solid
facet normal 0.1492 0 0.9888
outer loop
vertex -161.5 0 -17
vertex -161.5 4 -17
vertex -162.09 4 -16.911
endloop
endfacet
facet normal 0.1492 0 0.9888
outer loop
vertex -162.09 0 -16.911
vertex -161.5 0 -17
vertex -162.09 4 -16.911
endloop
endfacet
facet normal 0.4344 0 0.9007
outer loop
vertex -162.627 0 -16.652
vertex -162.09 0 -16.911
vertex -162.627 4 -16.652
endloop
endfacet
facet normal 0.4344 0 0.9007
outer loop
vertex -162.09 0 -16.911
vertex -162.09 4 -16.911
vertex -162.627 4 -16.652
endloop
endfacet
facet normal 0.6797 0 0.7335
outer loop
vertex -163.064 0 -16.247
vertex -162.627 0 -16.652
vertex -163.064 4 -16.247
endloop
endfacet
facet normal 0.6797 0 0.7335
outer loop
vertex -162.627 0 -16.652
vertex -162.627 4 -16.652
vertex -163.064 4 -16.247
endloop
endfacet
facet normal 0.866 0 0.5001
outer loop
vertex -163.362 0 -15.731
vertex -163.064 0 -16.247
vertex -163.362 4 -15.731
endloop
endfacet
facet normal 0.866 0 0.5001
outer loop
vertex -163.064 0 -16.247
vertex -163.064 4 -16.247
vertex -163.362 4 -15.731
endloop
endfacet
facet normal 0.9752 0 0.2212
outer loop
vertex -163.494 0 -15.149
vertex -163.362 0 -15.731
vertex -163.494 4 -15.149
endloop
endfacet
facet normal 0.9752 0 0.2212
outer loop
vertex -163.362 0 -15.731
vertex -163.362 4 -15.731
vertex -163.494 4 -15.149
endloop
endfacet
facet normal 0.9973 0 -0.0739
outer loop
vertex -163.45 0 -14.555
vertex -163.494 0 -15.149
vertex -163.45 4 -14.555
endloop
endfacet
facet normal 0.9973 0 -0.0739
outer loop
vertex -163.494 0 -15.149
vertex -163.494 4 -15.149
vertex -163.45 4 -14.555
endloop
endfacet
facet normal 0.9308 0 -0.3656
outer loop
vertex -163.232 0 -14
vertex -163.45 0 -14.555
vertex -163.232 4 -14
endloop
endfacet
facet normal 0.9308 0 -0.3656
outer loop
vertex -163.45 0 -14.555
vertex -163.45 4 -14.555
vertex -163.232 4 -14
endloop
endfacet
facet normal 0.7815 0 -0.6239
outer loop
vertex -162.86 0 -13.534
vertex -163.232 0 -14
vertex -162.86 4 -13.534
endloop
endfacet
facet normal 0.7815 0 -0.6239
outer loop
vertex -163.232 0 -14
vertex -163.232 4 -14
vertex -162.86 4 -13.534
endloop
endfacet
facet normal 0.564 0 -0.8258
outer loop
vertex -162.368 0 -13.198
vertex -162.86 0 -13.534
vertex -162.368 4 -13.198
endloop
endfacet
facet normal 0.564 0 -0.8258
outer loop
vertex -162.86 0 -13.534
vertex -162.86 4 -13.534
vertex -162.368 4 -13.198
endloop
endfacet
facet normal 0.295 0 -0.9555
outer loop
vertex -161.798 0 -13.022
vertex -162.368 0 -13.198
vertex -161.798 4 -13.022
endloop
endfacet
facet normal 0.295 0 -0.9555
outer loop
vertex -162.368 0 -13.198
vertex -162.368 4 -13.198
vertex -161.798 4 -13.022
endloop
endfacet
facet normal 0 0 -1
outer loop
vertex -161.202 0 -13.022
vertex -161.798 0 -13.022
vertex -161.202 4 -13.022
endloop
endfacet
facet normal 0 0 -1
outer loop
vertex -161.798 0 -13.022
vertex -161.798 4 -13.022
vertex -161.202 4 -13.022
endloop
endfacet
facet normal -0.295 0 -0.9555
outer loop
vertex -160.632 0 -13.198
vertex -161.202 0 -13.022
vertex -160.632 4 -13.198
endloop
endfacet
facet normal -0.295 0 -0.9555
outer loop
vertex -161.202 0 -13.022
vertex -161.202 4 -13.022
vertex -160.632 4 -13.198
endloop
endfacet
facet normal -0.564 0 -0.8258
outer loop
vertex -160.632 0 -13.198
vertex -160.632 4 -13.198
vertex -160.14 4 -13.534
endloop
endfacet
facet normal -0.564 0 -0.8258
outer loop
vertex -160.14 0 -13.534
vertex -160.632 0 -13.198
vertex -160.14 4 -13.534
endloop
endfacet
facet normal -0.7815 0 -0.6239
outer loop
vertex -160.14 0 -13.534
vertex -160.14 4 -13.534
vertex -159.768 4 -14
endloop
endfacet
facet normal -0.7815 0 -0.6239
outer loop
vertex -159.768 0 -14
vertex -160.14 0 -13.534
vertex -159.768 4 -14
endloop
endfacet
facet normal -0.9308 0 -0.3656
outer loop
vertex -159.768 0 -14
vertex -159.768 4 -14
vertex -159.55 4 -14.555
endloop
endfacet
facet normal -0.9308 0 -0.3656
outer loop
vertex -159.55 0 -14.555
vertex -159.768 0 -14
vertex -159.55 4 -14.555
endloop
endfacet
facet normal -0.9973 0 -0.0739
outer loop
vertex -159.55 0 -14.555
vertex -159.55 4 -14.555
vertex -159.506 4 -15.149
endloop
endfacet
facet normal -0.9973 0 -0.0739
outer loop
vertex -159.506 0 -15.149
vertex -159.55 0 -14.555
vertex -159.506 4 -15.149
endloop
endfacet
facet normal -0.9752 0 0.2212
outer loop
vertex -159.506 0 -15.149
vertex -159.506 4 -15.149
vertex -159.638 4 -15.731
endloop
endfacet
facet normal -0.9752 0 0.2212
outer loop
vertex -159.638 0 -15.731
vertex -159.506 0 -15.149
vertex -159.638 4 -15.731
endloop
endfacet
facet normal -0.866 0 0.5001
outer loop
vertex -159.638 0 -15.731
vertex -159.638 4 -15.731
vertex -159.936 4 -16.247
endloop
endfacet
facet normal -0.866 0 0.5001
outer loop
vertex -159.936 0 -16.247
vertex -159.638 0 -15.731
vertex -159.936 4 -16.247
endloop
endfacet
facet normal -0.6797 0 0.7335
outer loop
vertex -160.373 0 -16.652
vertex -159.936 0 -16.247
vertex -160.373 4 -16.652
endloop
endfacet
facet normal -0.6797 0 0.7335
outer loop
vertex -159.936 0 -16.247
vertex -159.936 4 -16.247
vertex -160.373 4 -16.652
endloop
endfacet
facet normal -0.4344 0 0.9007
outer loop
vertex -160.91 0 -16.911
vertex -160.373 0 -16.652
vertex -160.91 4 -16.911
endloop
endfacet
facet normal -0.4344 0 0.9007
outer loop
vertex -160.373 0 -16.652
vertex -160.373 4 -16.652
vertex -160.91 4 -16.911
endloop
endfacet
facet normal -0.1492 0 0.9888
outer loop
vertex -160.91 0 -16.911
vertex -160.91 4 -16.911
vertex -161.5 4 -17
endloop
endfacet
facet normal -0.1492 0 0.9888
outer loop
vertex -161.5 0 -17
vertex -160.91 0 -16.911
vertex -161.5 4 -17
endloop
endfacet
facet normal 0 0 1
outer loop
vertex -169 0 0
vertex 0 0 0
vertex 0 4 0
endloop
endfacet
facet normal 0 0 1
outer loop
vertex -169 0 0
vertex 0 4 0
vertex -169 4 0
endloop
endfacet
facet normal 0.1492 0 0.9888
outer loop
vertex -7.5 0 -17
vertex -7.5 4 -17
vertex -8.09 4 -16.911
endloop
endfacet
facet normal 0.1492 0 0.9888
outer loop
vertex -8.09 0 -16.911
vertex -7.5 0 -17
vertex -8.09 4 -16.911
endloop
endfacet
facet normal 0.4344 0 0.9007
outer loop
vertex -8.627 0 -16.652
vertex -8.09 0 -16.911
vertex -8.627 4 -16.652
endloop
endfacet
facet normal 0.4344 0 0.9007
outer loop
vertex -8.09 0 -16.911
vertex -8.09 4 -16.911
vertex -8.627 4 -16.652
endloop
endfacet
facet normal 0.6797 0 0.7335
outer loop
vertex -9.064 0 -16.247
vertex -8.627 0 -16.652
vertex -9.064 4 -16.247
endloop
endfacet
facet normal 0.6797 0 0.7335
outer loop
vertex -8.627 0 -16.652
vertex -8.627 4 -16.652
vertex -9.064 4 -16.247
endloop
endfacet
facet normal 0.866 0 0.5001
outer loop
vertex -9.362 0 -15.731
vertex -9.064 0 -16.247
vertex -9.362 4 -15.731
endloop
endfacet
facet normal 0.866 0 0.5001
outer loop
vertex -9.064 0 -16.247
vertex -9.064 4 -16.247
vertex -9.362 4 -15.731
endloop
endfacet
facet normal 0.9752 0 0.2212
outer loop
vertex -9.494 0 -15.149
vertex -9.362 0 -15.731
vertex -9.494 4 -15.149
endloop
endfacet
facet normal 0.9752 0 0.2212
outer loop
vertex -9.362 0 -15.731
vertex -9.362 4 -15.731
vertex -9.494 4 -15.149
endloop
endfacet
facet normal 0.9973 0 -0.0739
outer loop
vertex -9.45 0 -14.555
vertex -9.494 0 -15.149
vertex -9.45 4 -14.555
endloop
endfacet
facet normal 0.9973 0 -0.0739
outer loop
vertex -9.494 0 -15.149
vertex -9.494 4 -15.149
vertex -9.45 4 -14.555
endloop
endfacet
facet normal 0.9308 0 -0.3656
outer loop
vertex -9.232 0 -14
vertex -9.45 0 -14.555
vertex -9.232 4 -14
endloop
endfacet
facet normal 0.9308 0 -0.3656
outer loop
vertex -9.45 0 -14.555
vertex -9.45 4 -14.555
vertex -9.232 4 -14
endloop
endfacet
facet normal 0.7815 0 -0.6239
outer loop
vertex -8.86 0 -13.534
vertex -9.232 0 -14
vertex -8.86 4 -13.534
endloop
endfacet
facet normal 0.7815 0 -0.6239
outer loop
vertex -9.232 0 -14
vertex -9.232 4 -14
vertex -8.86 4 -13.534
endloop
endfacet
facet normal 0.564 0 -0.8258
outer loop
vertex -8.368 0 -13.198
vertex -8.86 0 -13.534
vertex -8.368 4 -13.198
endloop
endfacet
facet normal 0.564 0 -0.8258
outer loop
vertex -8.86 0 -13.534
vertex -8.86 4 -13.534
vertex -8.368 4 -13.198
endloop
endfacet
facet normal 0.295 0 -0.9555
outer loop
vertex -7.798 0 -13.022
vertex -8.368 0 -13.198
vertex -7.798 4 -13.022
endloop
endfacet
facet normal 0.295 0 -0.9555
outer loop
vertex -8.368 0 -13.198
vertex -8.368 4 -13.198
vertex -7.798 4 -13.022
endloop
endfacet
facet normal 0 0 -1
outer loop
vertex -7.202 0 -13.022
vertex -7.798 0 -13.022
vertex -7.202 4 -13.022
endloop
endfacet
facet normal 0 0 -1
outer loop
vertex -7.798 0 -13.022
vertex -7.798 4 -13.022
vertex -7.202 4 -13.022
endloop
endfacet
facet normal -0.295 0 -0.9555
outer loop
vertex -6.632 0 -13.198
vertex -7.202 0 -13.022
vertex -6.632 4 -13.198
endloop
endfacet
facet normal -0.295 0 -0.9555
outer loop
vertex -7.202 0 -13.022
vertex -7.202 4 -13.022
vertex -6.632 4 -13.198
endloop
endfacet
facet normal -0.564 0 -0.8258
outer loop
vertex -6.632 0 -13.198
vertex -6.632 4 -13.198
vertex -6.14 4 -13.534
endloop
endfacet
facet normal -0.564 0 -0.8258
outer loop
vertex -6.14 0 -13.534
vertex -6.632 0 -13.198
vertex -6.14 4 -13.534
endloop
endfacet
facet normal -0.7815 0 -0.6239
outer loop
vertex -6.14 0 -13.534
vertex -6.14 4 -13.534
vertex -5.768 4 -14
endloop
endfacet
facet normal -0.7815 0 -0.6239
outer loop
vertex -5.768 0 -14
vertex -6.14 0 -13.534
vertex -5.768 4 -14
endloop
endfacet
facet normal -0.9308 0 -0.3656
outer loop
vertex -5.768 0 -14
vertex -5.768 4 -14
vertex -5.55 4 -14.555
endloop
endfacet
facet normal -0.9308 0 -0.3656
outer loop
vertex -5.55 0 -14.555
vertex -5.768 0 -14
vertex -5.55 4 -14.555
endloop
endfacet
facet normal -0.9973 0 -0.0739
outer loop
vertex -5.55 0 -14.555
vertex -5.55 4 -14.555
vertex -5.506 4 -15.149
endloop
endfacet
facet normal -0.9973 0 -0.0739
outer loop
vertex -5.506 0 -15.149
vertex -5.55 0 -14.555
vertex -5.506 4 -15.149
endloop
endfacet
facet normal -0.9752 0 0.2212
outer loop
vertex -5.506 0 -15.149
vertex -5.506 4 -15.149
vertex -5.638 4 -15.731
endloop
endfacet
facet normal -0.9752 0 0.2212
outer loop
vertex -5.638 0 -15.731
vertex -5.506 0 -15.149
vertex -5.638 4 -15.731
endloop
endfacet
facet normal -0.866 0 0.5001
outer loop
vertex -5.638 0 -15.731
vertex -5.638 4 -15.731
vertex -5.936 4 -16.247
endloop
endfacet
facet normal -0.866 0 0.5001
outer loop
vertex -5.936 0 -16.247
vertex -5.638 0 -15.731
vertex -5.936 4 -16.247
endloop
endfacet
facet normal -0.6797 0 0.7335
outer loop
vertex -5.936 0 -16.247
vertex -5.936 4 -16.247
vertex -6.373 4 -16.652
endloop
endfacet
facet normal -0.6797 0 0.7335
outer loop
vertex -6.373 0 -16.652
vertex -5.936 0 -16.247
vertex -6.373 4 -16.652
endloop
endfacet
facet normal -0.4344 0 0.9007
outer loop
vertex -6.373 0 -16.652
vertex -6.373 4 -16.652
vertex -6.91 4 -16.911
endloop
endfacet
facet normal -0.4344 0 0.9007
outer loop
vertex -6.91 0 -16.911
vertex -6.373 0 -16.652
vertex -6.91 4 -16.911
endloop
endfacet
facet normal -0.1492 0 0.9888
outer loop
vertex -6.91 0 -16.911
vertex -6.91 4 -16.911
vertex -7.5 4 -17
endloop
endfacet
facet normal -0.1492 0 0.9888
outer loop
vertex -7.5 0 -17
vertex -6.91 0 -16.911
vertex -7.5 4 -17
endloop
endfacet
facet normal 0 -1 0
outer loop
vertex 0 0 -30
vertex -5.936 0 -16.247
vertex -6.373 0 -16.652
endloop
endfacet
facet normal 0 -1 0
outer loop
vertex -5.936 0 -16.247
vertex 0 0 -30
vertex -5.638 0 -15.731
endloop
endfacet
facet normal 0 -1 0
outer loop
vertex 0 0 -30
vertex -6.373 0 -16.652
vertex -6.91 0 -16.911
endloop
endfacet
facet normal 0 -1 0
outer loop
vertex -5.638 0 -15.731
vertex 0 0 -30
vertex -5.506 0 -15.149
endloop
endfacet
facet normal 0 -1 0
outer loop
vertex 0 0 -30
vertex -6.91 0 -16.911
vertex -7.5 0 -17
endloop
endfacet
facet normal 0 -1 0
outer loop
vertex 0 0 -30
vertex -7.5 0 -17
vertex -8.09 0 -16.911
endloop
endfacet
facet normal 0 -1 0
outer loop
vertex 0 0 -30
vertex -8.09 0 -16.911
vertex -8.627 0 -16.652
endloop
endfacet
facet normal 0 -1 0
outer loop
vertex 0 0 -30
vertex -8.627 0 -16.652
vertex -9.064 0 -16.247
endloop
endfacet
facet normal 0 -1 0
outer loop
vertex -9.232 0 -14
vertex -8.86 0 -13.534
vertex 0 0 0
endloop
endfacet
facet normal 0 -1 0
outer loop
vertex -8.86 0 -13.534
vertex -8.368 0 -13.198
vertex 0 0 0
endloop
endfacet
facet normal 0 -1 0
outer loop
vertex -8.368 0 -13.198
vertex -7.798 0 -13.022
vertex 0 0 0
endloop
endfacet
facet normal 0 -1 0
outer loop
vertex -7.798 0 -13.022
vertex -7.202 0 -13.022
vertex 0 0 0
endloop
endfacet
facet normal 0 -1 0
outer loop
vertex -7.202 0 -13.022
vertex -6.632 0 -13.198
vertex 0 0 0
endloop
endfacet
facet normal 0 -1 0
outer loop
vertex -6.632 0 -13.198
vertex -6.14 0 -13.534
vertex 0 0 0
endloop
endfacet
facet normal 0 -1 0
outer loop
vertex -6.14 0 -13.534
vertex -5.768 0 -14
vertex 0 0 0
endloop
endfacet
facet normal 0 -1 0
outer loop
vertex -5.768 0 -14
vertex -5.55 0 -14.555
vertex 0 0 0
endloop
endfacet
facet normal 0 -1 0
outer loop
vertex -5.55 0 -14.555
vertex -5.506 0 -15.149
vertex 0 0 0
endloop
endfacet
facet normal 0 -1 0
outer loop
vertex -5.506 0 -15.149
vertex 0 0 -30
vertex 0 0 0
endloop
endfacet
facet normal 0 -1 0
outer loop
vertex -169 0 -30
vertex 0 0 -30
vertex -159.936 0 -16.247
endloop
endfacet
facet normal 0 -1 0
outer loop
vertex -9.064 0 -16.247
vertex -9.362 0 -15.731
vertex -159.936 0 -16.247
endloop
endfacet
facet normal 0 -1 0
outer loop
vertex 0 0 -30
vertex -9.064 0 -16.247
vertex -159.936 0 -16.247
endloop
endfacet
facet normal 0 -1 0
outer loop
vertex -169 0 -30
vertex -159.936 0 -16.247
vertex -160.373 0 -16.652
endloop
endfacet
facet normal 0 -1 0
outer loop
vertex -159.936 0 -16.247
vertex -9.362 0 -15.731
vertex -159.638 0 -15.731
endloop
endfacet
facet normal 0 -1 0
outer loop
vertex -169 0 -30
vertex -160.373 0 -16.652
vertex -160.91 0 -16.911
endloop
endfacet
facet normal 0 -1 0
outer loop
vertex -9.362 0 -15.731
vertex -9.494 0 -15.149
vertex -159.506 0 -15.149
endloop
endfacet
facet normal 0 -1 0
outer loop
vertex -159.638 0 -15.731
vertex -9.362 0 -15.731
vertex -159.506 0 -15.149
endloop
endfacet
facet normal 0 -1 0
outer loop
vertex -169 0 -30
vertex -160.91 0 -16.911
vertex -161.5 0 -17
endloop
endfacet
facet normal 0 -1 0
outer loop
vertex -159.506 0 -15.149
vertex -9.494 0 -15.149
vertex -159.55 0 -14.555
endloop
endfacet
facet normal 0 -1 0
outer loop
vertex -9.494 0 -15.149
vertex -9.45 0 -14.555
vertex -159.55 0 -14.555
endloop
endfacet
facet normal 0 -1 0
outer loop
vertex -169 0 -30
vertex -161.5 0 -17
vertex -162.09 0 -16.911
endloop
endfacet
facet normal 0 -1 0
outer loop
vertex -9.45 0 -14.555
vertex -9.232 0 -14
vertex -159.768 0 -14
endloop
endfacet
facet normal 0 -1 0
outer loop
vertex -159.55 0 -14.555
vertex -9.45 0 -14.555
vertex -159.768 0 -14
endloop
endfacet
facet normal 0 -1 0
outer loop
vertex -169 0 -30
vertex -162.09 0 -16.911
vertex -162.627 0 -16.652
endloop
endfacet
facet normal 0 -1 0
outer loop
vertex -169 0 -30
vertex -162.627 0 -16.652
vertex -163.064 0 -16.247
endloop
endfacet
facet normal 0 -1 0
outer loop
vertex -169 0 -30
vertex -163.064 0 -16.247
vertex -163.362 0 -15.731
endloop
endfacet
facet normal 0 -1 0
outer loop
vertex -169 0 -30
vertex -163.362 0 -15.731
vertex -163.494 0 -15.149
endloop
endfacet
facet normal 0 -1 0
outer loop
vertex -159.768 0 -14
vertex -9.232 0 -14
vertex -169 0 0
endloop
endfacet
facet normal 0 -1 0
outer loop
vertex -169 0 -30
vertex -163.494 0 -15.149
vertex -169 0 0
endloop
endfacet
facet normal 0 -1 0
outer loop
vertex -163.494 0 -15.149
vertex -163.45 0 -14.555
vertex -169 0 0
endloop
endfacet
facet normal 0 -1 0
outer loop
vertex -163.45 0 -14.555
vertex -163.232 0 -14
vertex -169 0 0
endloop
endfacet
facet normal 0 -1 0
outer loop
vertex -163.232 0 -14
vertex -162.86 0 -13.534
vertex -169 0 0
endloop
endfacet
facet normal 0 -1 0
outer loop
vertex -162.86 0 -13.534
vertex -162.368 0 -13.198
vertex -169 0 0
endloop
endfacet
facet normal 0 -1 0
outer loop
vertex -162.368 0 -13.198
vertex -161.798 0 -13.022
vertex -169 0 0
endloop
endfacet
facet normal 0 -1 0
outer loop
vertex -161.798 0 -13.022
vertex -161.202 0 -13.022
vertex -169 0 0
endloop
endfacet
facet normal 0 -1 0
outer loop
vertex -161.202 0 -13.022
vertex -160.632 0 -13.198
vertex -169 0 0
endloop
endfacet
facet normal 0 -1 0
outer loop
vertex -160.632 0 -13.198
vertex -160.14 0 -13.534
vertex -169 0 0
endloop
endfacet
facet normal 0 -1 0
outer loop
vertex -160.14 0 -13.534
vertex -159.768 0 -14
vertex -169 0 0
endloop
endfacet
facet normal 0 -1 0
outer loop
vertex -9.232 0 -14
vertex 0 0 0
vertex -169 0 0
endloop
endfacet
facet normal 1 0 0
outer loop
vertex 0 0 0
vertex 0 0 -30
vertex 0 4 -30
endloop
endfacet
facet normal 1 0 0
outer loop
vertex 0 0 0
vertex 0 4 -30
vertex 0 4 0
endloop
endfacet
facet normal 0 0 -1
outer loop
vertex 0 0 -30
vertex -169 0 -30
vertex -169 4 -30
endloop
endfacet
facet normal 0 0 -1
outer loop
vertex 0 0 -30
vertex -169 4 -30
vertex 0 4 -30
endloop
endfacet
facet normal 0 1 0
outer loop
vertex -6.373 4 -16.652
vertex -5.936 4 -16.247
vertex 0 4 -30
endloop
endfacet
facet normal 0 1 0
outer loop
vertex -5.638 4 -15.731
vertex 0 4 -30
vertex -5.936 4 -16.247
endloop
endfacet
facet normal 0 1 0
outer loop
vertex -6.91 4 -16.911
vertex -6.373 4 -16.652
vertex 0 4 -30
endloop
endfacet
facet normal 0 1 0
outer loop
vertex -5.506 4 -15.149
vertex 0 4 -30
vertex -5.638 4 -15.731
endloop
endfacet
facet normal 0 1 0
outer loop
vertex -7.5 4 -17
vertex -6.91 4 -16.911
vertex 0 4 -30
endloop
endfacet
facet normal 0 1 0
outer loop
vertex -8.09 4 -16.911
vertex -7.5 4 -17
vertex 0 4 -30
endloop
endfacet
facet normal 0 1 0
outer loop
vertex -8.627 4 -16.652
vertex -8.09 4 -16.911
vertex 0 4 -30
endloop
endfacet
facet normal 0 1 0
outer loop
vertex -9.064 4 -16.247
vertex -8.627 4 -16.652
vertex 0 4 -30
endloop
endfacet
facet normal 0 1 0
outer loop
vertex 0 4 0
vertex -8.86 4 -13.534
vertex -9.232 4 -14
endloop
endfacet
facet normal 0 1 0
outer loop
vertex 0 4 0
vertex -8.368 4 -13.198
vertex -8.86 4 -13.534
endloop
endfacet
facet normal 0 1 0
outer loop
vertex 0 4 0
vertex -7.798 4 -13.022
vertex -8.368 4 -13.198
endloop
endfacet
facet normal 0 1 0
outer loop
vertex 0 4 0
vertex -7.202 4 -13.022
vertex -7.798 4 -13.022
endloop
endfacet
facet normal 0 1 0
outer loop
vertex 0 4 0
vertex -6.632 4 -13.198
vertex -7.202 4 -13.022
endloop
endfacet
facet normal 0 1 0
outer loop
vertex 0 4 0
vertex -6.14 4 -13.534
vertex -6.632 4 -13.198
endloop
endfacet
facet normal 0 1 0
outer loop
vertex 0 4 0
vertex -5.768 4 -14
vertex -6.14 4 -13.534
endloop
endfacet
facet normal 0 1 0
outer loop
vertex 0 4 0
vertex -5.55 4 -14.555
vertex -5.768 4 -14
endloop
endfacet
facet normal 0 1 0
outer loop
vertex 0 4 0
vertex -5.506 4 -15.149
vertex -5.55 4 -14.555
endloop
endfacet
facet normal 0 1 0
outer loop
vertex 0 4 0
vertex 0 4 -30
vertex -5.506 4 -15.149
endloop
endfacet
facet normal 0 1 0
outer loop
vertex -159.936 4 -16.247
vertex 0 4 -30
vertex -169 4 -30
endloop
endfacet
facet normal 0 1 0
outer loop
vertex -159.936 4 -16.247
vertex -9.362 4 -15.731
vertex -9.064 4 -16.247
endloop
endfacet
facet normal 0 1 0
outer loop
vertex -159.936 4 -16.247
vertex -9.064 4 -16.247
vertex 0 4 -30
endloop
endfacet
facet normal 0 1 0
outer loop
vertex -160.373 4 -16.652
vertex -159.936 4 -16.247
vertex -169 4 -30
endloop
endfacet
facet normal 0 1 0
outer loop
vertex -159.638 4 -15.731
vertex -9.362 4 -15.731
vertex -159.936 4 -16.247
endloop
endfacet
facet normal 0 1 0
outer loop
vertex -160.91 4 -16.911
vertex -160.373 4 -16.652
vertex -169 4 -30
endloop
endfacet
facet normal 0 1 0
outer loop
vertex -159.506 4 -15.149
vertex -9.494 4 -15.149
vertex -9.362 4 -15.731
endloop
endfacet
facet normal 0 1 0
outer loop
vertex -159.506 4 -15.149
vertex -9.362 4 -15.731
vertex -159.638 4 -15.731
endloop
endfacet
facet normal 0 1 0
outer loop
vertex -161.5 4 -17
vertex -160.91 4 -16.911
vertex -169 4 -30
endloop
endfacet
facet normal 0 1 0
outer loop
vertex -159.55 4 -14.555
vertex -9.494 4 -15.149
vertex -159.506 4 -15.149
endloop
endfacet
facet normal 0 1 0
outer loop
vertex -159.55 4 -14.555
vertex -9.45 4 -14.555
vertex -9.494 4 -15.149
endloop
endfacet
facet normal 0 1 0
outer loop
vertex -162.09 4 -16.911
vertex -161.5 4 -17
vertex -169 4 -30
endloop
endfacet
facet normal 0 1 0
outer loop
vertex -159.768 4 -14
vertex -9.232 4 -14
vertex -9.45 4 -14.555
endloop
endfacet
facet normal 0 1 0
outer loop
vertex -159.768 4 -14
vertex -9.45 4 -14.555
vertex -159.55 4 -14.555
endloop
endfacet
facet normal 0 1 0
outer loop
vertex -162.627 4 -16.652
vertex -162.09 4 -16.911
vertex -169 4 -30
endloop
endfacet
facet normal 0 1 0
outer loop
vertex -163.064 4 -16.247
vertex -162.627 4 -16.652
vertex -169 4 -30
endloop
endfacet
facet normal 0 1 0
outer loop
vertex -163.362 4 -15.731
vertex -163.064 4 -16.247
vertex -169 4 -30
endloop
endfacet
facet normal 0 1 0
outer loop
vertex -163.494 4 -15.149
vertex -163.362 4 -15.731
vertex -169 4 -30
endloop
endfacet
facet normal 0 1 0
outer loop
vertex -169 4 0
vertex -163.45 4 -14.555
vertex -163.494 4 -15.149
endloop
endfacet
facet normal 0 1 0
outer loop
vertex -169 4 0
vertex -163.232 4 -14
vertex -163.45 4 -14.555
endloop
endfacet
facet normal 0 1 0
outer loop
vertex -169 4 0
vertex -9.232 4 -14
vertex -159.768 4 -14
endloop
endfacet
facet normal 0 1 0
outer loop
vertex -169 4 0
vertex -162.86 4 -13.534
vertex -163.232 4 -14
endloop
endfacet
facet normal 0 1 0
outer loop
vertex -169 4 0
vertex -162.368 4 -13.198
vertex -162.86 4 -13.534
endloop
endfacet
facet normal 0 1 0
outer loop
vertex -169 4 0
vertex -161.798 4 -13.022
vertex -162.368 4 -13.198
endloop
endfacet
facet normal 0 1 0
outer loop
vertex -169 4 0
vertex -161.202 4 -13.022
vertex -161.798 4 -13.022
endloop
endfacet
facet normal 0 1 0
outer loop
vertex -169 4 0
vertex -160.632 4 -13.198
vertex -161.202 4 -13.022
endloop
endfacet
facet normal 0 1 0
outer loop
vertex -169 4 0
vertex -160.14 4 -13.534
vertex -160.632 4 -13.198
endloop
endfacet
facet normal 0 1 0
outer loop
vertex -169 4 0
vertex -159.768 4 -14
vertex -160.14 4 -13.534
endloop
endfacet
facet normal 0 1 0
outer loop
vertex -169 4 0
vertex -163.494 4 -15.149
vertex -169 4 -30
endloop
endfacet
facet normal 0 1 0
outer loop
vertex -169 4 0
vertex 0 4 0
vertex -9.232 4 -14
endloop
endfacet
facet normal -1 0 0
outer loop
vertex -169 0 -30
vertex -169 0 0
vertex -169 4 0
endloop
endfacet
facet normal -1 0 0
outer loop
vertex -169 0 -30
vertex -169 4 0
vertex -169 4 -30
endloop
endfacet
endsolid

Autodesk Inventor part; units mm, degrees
ref_plane "YZ Plane" through (0, 0, 0) normal (1, 0, 0) x (0, 1, 0)
ref_plane "XZ Plane" through (0, 0, 0) normal (0, 1, 0) x (-1, 0, 0)
ref_plane "XY Plane" through (0, 0, 0) normal (0, 0, 1) x (1, 0, 0)
sketch "Sketch1" plane through (0, 0, 0) normal (0, 1, 0) x (-1, 0, 0)
  line L0 (0, 0) -> (169, 0)
  line L1 (169, 0) -> (169, -30)
  line L2 (169, -30) -> (0, -30)
  line L3 (0, -30) -> (0, 0)
  dimension "d0" = 169
  dimension "d1" = 30
extrude "Extrusion1" add sketch "Sketch1" along normal blind 4
sketch "Sketch2" plane through (0, 0, 0) normal (0, -1, 0) x (1, 0, 0)
  line L0 (0, 0) -> (0, -30) projected
  line L1 (0, -15) -> (-169, -15) construction
  line L2 (-169, -30) -> (-169, 0) projected
  line L3 (-84.5, -15) -> (-84.5, 52.7002) construction
  point P0 (-161.5, -15)
  point P1 (-7.5, -15)
  dimension "d6" = 154
hole "Hole1" at (-161.5, 0, -15) at (-7.5, 0, -15) direction (0, 1, 0) diameter 4 end through all
sketch "Sketch3" plane through (0, 0, 0) normal (0, -1, 0) x (1, 0, 0)
  line L0 (-169, -30) -> (-169, 0) construction
  line L1 (-169, -15) -> (0, -15) construction
  line L2 (0, 0) -> (0, -30) construction
  line L3 (-169, -4.25) -> (0, -4.25)
  line L4 (-169, -4.25) -> (-169, -15)
  line L5 (0, -4.25) -> (0, -15)
  line L6 (-169, -25.75) -> (0, -25.75)
  line L7 (-169, -25.75) -> (-169, -15)
  line L8 (0, -25.75) -> (0, -15)
  dimension "d15" = 21.5
extrude "Extrusion2" [suppressed]
properties part number "ballastBar" material "Steel"
